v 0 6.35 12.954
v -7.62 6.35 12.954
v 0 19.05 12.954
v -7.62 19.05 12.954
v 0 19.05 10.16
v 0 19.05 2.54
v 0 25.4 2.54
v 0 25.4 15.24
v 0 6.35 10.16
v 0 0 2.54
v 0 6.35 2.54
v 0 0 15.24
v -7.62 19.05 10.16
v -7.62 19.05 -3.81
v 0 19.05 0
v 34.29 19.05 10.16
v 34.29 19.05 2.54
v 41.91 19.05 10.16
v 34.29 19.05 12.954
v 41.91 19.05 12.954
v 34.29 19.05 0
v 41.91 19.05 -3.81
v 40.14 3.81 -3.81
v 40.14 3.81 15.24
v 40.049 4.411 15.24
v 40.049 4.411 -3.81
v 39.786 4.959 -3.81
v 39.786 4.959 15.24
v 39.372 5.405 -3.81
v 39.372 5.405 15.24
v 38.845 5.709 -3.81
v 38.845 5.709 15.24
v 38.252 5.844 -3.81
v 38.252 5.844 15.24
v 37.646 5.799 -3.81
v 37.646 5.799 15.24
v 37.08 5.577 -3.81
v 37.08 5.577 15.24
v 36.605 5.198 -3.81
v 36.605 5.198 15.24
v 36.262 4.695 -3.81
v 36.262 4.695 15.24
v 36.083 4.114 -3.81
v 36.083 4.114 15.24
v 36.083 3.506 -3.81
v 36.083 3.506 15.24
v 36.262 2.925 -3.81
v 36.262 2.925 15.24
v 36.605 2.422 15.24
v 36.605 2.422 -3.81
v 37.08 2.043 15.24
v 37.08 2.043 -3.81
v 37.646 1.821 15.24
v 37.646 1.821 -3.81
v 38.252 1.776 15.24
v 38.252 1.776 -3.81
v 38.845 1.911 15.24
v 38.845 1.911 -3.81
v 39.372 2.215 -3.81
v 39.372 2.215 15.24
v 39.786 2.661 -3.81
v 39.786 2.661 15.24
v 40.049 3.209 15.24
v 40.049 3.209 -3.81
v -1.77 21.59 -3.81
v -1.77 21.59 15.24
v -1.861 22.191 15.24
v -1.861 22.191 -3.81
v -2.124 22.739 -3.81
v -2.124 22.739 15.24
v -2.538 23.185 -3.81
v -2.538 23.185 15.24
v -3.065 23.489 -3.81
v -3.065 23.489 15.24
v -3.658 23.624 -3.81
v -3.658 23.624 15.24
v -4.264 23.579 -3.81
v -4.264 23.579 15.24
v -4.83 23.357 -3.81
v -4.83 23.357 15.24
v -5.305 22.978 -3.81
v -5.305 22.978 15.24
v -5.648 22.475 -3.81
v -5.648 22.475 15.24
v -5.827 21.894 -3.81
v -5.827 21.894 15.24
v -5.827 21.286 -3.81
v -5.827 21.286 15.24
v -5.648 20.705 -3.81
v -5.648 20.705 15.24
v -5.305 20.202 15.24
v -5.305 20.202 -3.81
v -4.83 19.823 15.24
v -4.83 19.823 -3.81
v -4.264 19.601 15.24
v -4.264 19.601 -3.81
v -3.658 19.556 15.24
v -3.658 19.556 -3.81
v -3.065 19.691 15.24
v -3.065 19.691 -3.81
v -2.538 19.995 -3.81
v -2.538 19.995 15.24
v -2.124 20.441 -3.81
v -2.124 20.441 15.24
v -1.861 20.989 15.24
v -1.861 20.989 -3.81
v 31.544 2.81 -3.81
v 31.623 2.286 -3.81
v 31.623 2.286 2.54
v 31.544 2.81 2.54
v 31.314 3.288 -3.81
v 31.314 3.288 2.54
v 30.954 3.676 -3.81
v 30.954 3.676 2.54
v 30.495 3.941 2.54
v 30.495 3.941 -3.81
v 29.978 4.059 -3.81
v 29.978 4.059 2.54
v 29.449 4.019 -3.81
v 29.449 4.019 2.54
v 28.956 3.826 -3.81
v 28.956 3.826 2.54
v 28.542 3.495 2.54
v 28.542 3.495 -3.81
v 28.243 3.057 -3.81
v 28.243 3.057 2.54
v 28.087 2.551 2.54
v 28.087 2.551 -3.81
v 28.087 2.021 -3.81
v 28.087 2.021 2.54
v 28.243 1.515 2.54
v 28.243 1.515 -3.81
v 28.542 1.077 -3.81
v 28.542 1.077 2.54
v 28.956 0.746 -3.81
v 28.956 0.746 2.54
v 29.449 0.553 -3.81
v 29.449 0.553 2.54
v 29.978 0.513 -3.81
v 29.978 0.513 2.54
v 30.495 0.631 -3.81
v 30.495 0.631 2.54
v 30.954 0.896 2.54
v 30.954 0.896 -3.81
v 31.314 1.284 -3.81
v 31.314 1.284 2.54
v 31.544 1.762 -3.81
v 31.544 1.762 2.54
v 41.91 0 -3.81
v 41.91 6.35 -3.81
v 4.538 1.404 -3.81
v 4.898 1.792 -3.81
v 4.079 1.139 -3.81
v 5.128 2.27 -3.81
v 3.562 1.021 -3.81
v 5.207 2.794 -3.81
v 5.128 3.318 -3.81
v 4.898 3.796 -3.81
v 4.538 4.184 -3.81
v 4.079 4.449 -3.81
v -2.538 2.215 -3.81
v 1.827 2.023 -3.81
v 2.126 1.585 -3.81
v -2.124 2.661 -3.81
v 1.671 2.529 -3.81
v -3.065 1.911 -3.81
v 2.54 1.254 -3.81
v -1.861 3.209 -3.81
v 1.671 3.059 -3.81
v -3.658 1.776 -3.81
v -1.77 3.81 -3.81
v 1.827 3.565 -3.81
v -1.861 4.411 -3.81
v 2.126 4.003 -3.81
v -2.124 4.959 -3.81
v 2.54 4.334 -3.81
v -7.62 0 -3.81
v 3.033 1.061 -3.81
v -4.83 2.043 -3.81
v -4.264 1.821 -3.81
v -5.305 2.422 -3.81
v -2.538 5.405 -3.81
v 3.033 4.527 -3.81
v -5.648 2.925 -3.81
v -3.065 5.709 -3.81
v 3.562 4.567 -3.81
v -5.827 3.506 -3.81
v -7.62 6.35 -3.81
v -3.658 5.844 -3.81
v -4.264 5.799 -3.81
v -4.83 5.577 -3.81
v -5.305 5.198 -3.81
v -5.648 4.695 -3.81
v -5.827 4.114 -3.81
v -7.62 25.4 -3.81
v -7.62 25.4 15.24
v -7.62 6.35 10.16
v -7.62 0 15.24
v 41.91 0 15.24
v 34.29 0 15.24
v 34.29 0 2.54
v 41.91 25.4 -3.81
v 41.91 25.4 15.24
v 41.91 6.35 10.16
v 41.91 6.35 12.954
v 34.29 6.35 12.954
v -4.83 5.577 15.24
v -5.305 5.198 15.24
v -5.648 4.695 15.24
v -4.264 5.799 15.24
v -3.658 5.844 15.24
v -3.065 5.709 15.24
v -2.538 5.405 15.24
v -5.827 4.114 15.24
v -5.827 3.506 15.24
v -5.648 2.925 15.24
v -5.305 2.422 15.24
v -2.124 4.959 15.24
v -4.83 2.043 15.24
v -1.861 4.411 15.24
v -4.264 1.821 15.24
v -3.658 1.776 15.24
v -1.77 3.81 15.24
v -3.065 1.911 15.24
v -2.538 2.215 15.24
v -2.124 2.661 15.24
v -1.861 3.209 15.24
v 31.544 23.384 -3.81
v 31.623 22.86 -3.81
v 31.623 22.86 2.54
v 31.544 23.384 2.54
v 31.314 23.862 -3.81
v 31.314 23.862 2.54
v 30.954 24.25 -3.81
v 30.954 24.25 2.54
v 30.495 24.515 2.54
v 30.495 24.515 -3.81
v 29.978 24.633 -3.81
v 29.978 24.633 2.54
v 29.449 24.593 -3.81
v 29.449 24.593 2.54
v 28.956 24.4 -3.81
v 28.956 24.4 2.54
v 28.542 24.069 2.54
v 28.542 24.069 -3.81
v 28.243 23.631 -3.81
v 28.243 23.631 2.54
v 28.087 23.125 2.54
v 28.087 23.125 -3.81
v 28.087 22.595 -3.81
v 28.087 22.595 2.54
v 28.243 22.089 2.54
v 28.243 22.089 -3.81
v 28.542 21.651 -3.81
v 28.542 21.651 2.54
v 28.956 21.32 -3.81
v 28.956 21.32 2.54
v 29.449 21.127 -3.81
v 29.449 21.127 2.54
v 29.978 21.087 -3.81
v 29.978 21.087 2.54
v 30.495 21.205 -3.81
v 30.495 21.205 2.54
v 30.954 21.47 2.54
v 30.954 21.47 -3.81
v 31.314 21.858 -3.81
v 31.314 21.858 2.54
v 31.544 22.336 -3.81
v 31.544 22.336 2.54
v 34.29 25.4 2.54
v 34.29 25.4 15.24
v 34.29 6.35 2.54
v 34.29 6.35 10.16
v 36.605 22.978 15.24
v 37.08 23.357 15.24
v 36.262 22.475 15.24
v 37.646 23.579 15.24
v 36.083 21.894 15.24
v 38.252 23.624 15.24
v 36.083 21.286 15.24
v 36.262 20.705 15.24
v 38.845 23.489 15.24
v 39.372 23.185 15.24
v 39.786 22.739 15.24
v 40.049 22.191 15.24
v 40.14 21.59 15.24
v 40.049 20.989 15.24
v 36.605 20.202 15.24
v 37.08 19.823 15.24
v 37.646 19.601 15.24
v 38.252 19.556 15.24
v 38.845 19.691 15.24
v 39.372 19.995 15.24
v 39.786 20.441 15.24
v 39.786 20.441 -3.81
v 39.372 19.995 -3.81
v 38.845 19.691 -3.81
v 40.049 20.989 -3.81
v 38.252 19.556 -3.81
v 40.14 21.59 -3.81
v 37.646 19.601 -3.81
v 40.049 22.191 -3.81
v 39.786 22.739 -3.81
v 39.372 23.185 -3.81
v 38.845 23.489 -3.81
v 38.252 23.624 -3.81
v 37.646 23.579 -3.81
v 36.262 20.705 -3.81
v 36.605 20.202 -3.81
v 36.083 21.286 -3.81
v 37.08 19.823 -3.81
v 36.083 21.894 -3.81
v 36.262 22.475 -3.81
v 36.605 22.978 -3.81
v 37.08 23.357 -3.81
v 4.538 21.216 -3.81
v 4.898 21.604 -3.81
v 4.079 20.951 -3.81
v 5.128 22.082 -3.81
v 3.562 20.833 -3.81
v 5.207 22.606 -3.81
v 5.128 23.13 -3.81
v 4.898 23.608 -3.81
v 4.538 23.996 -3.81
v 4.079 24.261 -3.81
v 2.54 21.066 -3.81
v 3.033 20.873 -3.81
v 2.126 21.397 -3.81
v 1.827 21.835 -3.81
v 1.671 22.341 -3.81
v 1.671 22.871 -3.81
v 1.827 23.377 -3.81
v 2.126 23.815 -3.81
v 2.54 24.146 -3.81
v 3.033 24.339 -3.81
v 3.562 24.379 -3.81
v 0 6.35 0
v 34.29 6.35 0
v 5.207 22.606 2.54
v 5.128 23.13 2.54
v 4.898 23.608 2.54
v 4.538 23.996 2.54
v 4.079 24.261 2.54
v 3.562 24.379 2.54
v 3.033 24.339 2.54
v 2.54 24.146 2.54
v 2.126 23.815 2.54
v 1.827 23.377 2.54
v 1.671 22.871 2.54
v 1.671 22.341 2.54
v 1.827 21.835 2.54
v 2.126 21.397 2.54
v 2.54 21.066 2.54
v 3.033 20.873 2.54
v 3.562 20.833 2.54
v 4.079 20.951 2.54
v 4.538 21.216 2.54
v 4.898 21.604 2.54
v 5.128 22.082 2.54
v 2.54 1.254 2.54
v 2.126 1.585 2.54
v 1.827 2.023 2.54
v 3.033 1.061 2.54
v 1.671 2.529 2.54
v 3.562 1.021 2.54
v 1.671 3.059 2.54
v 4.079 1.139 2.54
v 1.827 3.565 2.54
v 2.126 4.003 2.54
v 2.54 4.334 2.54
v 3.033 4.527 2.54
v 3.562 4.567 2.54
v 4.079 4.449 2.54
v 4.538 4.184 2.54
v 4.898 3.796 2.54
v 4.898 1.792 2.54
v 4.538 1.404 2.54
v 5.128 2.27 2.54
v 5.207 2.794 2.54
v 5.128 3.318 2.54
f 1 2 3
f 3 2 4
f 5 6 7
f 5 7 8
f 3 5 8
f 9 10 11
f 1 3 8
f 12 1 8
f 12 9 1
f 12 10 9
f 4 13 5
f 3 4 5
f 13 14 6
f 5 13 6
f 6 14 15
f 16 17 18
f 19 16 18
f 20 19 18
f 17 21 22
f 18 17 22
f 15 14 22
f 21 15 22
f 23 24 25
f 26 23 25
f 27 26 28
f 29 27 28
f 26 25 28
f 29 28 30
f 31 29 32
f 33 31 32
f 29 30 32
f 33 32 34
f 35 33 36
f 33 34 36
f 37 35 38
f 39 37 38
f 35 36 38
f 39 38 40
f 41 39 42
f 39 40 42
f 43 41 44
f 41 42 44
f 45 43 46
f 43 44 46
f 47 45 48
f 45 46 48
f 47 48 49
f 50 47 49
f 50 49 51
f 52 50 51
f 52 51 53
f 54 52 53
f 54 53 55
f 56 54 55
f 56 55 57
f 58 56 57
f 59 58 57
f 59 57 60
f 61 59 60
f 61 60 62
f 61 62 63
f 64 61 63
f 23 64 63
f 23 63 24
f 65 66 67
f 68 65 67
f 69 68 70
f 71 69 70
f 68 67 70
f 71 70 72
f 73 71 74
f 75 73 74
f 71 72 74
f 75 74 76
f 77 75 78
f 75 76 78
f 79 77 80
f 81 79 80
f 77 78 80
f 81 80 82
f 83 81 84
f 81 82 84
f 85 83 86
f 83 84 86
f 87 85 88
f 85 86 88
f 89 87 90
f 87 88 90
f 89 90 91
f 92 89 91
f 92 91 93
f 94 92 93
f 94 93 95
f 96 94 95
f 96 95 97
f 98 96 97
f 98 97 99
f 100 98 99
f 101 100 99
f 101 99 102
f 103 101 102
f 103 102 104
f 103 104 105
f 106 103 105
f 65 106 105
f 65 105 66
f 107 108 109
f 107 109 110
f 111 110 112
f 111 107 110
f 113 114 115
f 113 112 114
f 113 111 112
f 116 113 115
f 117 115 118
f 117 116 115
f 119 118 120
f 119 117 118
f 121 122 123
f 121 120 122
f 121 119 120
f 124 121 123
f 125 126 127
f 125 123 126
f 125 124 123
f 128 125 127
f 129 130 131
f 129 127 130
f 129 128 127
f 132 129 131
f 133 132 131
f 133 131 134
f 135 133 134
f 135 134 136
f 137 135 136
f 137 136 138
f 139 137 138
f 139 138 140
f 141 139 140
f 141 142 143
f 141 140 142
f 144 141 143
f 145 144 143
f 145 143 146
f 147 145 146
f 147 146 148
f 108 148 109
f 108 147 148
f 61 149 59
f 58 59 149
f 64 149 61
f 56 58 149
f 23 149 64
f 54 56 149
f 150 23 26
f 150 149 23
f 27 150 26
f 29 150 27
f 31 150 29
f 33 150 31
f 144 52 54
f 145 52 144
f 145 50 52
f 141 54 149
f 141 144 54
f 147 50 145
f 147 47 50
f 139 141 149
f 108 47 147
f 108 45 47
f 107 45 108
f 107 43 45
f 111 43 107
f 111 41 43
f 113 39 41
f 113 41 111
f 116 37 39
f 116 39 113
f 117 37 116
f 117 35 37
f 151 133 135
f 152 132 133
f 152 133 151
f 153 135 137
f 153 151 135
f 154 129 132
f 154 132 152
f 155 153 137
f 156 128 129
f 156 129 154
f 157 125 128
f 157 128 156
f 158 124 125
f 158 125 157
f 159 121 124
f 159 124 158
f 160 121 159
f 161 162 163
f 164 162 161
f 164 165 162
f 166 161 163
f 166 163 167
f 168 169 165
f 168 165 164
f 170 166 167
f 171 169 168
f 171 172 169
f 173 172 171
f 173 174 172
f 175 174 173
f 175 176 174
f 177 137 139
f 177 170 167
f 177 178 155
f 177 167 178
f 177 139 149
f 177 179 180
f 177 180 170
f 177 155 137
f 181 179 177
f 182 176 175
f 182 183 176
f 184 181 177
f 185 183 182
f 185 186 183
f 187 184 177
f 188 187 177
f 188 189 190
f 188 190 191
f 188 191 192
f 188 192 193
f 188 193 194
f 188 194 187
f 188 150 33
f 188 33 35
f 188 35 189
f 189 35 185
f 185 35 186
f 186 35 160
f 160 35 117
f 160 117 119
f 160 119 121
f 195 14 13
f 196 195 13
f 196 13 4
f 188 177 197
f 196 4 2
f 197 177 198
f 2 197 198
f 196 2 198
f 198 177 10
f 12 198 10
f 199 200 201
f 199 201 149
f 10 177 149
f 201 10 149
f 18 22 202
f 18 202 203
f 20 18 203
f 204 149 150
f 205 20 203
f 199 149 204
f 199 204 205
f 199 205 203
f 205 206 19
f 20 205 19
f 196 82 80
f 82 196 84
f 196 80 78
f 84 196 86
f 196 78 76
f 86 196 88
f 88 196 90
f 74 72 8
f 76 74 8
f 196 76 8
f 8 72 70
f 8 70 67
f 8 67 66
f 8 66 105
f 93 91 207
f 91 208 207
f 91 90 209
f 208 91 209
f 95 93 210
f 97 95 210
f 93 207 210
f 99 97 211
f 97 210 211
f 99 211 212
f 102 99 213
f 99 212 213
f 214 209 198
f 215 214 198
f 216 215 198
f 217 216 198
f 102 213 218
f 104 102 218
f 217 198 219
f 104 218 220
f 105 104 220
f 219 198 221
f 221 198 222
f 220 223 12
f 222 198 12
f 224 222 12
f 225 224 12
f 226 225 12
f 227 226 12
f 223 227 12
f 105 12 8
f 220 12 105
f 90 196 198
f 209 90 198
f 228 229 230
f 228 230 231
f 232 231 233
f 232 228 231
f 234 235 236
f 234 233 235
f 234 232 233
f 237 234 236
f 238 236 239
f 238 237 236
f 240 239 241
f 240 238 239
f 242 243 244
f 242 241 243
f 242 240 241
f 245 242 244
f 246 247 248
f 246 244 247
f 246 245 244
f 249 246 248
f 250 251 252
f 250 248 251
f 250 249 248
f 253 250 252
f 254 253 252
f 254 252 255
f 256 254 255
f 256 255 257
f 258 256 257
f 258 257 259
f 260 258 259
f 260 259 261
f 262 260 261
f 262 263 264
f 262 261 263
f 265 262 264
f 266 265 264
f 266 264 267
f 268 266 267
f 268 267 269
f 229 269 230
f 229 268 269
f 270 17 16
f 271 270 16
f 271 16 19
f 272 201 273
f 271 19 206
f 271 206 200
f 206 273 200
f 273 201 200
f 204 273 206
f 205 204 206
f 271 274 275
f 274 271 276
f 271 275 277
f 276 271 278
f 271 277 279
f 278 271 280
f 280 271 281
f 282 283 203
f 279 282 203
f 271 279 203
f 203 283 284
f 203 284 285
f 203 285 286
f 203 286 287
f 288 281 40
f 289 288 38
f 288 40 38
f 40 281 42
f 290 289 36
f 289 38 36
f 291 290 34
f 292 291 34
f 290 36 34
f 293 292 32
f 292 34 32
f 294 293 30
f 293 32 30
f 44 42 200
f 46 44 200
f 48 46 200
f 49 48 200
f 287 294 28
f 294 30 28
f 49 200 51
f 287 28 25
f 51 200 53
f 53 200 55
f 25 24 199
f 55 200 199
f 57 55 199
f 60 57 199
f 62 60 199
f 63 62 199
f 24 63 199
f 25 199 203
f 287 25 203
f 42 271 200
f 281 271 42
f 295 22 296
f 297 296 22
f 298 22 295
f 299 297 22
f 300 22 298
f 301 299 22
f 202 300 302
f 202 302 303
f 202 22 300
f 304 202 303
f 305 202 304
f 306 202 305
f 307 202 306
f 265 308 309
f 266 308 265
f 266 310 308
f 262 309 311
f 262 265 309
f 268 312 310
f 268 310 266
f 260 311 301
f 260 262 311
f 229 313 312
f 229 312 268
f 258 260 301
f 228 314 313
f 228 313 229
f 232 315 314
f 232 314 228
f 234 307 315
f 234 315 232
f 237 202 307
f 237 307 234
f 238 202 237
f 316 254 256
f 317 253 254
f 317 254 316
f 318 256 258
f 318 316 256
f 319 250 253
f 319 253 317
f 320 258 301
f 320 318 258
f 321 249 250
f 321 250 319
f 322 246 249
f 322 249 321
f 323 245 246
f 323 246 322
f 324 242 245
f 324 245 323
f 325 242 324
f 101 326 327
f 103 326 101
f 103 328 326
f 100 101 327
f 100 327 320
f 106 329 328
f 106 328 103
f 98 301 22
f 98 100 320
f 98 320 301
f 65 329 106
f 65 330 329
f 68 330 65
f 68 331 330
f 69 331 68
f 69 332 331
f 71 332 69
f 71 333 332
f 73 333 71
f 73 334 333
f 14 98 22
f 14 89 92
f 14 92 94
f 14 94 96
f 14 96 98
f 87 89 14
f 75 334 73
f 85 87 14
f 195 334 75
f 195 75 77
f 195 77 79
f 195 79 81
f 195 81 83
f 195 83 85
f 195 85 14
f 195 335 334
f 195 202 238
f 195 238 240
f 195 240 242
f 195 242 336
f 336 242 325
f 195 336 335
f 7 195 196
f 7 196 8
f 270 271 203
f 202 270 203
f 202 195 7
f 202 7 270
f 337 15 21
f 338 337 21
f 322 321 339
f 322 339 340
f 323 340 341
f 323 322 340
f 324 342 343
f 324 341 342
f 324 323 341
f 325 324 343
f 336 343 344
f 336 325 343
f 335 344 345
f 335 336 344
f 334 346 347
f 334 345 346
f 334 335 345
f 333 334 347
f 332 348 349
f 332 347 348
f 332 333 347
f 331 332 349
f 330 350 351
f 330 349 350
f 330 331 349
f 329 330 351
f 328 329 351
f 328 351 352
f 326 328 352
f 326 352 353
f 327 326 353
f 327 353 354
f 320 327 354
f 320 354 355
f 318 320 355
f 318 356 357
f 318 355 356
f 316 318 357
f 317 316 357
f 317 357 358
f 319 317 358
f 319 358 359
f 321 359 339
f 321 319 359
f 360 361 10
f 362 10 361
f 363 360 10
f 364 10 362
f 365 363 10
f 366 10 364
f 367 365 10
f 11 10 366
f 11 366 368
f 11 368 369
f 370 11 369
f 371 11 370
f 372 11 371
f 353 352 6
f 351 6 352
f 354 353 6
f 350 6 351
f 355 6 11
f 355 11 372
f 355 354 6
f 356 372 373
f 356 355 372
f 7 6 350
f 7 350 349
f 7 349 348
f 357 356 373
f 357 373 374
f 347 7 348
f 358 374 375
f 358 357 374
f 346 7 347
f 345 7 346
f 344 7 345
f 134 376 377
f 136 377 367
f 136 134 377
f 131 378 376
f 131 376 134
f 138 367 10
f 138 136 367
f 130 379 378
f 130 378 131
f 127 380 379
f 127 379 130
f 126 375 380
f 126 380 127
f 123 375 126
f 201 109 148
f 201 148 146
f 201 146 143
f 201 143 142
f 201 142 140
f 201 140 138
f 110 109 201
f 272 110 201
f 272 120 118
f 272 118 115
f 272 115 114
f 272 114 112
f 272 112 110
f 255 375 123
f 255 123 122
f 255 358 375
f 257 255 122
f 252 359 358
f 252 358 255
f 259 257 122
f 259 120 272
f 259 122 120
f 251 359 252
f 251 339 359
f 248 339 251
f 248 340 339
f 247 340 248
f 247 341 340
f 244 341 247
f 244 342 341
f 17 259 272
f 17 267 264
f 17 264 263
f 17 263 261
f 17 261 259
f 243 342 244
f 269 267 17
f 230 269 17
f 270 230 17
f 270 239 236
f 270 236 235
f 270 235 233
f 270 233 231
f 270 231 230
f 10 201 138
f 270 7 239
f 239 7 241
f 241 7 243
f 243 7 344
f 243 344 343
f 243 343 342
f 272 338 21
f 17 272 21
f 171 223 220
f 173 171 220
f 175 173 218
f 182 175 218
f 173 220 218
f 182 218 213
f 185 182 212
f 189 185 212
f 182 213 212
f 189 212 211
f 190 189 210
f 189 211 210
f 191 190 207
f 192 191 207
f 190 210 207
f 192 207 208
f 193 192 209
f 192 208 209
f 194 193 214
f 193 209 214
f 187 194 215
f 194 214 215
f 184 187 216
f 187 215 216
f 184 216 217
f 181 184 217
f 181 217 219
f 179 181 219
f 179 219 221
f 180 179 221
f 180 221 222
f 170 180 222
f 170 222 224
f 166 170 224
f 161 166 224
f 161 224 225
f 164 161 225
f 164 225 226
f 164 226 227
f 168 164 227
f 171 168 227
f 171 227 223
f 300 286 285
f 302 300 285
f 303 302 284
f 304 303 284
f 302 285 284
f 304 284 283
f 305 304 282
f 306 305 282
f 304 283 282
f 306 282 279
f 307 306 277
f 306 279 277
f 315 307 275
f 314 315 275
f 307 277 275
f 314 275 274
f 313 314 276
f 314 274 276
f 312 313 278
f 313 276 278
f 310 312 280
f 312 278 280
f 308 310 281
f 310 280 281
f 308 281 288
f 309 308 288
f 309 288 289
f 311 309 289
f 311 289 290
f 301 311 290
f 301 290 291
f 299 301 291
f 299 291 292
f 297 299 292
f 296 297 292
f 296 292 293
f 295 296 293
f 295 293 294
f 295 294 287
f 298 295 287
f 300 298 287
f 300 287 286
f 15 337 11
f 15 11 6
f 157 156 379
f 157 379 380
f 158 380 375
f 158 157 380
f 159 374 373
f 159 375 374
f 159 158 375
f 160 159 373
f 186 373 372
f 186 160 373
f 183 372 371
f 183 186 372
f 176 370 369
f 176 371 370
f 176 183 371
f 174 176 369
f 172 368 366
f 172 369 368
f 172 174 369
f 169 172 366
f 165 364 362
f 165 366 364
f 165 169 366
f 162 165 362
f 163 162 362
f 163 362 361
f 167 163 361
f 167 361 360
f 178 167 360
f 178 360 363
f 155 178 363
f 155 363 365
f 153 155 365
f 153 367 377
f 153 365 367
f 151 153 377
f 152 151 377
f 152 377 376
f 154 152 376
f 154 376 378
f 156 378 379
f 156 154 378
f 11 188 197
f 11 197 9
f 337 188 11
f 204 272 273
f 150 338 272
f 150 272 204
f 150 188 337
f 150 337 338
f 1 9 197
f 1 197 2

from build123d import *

# Parameters (mm, degrees)
SKETCH1_W               = 34.29
SKETCH1_H               = 25.4
BOSS_EXTRUDE1_DEPTH     = 2.54
SKETCH3_W               = 49.53
SKETCH3_H               = 6.35
BOSS_EXTRUDE2_DEPTH     = 3.81
CUT_EXTRUDE1_DEPTH      = 50.415894204
CUT_EXTRUDE1_DEPTH_BACK = 50.415894204
SKETCH2_R               = 1.778
SKETCH5_W               = 7.62
SKETCH5_H               = 6.35
BOSS_EXTRUDE3_DEPTH     = 15.24
BOSS_EXTRUDE4_REACH     = 53.321
SKETCH6_W               = 7.62
SKETCH6_H               = 5.08
SKETCH7_R               = 2.04
SKETCH7_R_2             = 2.039999984
CUT_EXTRUDE2_DEPTH      = 53.578613523
SKETCH9_W               = 2.794
SKETCH9_H               = 12.699691263
CUT_EXTRUDE3_DEPTH      = 58.711684259


with BuildPart() as part:
    # Sketch1 → Boss-Extrude1 (new body)
    with BuildSketch(Plane.XY):
        with Locations((17.145, 12.7)):
            Rectangle(SKETCH1_W, SKETCH1_H)
    extrude(amount=BOSS_EXTRUDE1_DEPTH)

    # Sketch3 → Boss-Extrude2 (add)
    with BuildSketch(Plane(origin=(0, 0, 0), x_dir=(-1, 0, 0), z_dir=(0, 0, -1))):
        with Locations((-17.145, 22.225)):
            Rectangle(SKETCH3_W, SKETCH3_H)
        with Locations((-17.145, 3.175)):
            Rectangle(SKETCH3_W, SKETCH3_H)
    extrude(amount=BOSS_EXTRUDE2_DEPTH)

    # Sketch2 → Cut-Extrude1 (cut, two sides: drawn at the far end of the back side and taken through both)
    with BuildSketch(Plane.XY.offset(2.54).offset(-CUT_EXTRUDE1_DEPTH_BACK)):
        with Locations((3.429, 22.606)):
            Circle(SKETCH2_R)
        with Locations((29.845, 22.86)):
            Circle(SKETCH2_R)
        with Locations((3.429, 2.794)):
            Circle(SKETCH2_R)
        with Locations((29.845, 2.286)):
            Circle(SKETCH2_R)
    extrude(amount=CUT_EXTRUDE1_DEPTH + CUT_EXTRUDE1_DEPTH_BACK, mode=Mode.SUBTRACT)

    # Sketch5 → Boss-Extrude3 (add)
    with BuildSketch(Plane.XY):
        with Locations((-3.81, 22.225)):
            Rectangle(SKETCH5_W, SKETCH5_H)
        with Locations((38.1, 22.225)):
            Rectangle(SKETCH5_W, SKETCH5_H)
        with Locations((38.1, 3.175)):
            Rectangle(SKETCH5_W, SKETCH5_H)
        with Locations((-3.81, 3.175)):
            Rectangle(SKETCH5_W, SKETCH5_H)
    extrude(amount=BOSS_EXTRUDE3_DEPTH)

    # Sketch6 → Boss-Extrude4 (add, up to next)
    with BuildSketch(Plane.XZ, mode=Mode.PRIVATE) as boss_extrude4_sk1:
        with Locations((-3.81, 12.7)):
            Rectangle(SKETCH6_W, SKETCH6_H)
    boss_extrude4_tool1 = extrude(boss_extrude4_sk1.sketch, amount=-BOSS_EXTRUDE4_REACH, mode=Mode.PRIVATE) - part.part
    # Sketch6 → Boss-Extrude4 (add, up to next)
    with BuildSketch(Plane.XZ, mode=Mode.PRIVATE) as boss_extrude4_sk2:
        with Locations((38.1, 12.7)):
            Rectangle(SKETCH6_W, SKETCH6_H)
    boss_extrude4_tool2 = extrude(boss_extrude4_sk2.sketch, amount=-BOSS_EXTRUDE4_REACH, mode=Mode.PRIVATE) - part.part
    add(boss_extrude4_tool1.solids().sort_by_distance((-3.81, 0, 12.7))[0])
    add(boss_extrude4_tool2.solids().sort_by_distance((38.1, 0, 12.7))[0])

    # Sketch7 → Cut-Extrude2 (cut, through all)
    with BuildSketch(Plane.XY.offset(15.24)):
        with Locations((38.1, 3.81)):
            Circle(SKETCH7_R)
        with Locations((38.1, 21.59)):
            Circle(SKETCH7_R_2)
        with Locations((-3.81, 3.81)):
            Circle(SKETCH7_R_2)
        with Locations((-3.81, 21.59)):
            Circle(SKETCH7_R_2)
    extrude(amount=-CUT_EXTRUDE2_DEPTH, mode=Mode.SUBTRACT)

    # Sketch9 → Cut-Extrude3 (cut, through all)
    with BuildSketch(Plane.ZY.offset(7.62)):
        with Locations((11.557, 12.700154369)):
            Rectangle(SKETCH9_W, SKETCH9_H)
    extrude(amount=-CUT_EXTRUDE3_DEPTH, mode=Mode.SUBTRACT)


solid = part.part
